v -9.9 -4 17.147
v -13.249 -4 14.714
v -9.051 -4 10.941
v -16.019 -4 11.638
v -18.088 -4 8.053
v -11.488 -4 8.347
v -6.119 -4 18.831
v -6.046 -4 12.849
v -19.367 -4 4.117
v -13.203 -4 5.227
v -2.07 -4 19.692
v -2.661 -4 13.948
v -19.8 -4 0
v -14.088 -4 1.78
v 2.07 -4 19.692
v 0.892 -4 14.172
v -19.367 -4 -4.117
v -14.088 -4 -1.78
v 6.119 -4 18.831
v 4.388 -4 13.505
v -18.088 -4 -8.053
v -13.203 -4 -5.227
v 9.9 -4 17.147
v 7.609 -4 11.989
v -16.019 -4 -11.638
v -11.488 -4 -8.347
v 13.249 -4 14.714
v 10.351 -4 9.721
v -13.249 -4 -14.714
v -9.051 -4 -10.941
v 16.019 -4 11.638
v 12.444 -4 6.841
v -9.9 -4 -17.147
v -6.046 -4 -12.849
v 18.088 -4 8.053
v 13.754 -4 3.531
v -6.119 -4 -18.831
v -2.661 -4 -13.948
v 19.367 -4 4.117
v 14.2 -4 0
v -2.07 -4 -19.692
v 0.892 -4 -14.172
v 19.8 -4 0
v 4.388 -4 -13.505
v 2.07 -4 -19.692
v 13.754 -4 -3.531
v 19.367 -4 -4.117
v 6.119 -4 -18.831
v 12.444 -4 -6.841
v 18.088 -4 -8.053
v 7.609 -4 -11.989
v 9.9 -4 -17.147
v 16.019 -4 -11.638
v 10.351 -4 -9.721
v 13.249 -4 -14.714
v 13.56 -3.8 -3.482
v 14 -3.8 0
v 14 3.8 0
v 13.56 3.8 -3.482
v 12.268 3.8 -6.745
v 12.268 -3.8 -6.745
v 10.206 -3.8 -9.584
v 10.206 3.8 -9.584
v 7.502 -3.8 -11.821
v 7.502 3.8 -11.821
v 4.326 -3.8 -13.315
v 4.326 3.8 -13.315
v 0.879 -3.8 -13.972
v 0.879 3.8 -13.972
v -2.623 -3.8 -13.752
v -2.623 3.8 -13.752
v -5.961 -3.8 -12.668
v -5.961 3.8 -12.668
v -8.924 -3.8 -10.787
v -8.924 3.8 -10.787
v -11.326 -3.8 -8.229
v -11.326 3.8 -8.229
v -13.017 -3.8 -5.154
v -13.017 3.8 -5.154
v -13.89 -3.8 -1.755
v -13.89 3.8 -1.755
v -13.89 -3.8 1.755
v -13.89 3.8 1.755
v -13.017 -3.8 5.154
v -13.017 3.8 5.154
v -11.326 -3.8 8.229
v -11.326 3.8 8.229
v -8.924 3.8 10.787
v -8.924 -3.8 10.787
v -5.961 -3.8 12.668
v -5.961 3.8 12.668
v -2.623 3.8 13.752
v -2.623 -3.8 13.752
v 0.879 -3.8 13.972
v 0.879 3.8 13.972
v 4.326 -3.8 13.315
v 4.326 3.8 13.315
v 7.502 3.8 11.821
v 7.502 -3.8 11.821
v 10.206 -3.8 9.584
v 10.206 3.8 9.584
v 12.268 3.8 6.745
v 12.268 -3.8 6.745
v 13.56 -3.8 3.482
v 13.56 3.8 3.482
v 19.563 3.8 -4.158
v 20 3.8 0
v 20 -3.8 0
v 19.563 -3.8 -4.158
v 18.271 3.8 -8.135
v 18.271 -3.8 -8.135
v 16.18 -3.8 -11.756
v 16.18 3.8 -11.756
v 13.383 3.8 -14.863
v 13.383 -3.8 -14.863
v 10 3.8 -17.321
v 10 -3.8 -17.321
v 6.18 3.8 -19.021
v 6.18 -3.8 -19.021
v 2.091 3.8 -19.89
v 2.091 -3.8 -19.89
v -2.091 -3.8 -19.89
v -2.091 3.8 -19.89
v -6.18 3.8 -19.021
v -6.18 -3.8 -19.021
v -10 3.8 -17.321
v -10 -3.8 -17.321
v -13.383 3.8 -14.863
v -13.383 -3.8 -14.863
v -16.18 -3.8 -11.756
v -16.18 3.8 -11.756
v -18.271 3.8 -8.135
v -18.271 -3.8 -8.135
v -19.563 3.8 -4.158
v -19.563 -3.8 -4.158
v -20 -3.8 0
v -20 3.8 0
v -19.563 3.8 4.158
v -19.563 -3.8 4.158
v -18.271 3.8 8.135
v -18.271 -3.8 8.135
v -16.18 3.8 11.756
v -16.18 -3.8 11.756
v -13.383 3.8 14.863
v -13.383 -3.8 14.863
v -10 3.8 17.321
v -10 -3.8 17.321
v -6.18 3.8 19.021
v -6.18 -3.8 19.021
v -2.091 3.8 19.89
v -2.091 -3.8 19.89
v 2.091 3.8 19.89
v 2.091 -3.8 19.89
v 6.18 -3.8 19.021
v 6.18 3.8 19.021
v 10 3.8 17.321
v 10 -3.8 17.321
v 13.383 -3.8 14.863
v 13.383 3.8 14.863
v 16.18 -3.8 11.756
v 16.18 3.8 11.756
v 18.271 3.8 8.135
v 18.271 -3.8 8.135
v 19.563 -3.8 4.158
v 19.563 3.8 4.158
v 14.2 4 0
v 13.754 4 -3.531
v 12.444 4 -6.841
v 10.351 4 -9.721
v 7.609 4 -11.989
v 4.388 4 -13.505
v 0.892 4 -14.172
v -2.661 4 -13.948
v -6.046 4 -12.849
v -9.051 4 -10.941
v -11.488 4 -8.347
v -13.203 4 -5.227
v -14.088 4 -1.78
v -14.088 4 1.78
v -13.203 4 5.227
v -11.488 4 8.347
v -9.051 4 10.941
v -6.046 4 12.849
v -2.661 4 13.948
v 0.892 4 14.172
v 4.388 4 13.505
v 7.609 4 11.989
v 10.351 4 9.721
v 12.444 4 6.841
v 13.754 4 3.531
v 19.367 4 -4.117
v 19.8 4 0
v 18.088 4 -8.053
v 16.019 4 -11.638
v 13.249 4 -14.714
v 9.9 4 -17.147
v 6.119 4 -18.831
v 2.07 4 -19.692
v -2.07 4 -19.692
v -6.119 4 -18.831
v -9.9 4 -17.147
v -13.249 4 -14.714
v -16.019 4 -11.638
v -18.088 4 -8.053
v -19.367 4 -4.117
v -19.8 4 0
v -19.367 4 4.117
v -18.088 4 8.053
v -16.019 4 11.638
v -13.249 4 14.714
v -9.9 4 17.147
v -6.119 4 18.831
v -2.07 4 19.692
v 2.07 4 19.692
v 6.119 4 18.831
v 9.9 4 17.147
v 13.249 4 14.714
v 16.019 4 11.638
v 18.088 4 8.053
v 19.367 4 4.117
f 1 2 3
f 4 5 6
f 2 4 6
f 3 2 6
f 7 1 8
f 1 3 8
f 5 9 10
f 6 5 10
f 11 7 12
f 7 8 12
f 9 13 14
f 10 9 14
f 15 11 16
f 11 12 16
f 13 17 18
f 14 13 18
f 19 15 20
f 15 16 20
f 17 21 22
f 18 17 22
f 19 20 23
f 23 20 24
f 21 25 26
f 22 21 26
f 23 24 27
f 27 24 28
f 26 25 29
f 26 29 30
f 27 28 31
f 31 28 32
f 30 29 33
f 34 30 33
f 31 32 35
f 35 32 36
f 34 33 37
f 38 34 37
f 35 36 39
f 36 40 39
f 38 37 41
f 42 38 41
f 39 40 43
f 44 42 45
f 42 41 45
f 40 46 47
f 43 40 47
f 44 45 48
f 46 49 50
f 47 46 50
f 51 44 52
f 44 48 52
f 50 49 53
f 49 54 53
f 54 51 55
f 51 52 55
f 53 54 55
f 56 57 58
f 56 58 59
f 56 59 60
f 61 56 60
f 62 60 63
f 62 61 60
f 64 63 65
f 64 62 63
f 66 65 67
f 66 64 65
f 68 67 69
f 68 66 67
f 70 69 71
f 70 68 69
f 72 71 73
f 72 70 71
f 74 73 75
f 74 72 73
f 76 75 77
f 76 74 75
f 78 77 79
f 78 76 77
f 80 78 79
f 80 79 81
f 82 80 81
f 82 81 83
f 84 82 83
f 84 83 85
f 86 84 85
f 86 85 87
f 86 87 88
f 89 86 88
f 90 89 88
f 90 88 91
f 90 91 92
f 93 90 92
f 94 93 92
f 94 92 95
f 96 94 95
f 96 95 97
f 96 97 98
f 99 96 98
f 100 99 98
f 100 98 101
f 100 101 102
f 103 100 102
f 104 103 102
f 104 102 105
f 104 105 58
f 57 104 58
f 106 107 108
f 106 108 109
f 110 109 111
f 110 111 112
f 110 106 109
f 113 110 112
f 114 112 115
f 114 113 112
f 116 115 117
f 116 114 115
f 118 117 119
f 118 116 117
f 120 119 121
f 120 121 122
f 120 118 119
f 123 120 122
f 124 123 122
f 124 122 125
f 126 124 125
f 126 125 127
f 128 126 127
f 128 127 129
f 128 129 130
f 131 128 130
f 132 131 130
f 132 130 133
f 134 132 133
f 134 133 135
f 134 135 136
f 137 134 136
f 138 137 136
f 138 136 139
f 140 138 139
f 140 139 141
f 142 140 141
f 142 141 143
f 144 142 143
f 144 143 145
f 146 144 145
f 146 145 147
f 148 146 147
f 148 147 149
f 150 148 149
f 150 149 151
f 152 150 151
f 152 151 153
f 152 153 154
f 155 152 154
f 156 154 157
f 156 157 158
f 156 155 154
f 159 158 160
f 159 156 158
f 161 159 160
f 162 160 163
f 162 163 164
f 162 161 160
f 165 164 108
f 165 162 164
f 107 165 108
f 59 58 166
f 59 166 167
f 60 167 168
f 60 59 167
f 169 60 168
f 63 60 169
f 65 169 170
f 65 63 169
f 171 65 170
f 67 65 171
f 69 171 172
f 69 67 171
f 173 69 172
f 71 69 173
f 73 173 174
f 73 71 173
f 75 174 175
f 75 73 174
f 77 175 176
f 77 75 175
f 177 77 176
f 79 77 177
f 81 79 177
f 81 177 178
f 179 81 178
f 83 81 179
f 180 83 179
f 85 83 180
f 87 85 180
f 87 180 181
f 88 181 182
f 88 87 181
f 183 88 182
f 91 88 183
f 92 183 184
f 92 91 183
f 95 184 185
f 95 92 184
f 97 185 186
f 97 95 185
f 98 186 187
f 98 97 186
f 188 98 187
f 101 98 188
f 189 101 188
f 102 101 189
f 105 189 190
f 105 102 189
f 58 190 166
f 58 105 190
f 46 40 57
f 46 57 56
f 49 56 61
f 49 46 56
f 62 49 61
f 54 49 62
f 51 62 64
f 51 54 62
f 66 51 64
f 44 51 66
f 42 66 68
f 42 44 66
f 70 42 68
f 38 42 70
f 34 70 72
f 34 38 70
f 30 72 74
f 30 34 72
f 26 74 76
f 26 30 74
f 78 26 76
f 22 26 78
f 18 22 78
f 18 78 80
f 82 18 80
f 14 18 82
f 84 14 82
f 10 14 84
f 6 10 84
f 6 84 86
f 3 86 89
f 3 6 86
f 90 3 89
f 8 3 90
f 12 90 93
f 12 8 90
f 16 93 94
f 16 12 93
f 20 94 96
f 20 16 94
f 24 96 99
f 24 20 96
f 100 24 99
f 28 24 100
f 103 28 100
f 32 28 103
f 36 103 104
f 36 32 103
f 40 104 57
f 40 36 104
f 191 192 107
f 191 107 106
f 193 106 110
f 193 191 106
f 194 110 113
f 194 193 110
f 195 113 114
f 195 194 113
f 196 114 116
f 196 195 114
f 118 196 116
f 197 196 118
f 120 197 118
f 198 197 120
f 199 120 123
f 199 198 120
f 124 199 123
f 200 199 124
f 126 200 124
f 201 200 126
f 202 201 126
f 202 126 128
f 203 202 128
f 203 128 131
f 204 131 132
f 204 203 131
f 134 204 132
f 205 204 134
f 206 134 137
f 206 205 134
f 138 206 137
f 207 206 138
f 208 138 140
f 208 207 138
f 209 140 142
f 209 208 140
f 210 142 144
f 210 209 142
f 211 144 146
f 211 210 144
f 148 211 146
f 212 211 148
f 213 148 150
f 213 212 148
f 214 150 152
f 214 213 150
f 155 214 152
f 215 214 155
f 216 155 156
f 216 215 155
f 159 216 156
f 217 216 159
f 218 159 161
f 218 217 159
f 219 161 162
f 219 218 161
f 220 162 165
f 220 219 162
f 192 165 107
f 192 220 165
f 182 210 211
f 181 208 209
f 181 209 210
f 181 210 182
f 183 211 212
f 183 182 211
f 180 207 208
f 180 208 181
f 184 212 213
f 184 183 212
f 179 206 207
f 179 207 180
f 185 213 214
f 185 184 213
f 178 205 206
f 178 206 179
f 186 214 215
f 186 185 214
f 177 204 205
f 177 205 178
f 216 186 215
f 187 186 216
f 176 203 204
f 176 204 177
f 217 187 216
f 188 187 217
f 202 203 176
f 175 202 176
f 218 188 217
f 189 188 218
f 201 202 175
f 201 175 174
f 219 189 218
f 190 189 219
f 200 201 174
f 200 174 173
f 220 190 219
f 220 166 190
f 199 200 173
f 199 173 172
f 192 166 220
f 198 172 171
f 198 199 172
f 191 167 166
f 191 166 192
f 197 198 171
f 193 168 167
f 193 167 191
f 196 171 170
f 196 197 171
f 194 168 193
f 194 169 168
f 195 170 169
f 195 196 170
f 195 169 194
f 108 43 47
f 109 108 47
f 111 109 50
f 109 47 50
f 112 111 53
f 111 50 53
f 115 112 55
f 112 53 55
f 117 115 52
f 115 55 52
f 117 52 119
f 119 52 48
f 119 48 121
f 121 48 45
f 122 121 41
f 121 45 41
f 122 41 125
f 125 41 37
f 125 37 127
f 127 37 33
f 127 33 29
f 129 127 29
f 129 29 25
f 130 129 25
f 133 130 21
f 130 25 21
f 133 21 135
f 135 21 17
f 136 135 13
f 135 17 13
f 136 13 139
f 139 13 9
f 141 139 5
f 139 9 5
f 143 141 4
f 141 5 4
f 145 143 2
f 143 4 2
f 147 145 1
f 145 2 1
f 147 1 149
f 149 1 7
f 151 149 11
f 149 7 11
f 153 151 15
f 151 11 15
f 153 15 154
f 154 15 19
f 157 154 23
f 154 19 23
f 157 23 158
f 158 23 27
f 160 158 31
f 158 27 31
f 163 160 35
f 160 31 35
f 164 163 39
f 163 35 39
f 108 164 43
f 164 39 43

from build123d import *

# Parameters (mm, degrees)
SKETCH1_R           = 20
SKETCH1_R_2         = 14
BOSS_EXTRUDE1_DEPTH = 4
CHAMFER1_SIZE       = 0.2


with BuildPart() as part:
    # Sketch1 → Boss-Extrude1 (new body, symmetric)
    with BuildSketch(Plane(origin=(0, 0, 0), x_dir=(1, 0, 0), z_dir=(0, 1, 0))):
        Circle(SKETCH1_R)
        Circle(SKETCH1_R_2, mode=Mode.SUBTRACT)
    extrude(amount=BOSS_EXTRUDE1_DEPTH, both=True)

    # Chamfer1
    chamfer1_edges = [part.edges().sort_by_distance(p)[0] for p in [
        (-20, -4, 0),
        (-20, 4, 0),
        (-14, -4, 0),
        (-14, 4, 0),
    ]]
    chamfer(chamfer1_edges, length=CHAMFER1_SIZE)


solid = part.part
